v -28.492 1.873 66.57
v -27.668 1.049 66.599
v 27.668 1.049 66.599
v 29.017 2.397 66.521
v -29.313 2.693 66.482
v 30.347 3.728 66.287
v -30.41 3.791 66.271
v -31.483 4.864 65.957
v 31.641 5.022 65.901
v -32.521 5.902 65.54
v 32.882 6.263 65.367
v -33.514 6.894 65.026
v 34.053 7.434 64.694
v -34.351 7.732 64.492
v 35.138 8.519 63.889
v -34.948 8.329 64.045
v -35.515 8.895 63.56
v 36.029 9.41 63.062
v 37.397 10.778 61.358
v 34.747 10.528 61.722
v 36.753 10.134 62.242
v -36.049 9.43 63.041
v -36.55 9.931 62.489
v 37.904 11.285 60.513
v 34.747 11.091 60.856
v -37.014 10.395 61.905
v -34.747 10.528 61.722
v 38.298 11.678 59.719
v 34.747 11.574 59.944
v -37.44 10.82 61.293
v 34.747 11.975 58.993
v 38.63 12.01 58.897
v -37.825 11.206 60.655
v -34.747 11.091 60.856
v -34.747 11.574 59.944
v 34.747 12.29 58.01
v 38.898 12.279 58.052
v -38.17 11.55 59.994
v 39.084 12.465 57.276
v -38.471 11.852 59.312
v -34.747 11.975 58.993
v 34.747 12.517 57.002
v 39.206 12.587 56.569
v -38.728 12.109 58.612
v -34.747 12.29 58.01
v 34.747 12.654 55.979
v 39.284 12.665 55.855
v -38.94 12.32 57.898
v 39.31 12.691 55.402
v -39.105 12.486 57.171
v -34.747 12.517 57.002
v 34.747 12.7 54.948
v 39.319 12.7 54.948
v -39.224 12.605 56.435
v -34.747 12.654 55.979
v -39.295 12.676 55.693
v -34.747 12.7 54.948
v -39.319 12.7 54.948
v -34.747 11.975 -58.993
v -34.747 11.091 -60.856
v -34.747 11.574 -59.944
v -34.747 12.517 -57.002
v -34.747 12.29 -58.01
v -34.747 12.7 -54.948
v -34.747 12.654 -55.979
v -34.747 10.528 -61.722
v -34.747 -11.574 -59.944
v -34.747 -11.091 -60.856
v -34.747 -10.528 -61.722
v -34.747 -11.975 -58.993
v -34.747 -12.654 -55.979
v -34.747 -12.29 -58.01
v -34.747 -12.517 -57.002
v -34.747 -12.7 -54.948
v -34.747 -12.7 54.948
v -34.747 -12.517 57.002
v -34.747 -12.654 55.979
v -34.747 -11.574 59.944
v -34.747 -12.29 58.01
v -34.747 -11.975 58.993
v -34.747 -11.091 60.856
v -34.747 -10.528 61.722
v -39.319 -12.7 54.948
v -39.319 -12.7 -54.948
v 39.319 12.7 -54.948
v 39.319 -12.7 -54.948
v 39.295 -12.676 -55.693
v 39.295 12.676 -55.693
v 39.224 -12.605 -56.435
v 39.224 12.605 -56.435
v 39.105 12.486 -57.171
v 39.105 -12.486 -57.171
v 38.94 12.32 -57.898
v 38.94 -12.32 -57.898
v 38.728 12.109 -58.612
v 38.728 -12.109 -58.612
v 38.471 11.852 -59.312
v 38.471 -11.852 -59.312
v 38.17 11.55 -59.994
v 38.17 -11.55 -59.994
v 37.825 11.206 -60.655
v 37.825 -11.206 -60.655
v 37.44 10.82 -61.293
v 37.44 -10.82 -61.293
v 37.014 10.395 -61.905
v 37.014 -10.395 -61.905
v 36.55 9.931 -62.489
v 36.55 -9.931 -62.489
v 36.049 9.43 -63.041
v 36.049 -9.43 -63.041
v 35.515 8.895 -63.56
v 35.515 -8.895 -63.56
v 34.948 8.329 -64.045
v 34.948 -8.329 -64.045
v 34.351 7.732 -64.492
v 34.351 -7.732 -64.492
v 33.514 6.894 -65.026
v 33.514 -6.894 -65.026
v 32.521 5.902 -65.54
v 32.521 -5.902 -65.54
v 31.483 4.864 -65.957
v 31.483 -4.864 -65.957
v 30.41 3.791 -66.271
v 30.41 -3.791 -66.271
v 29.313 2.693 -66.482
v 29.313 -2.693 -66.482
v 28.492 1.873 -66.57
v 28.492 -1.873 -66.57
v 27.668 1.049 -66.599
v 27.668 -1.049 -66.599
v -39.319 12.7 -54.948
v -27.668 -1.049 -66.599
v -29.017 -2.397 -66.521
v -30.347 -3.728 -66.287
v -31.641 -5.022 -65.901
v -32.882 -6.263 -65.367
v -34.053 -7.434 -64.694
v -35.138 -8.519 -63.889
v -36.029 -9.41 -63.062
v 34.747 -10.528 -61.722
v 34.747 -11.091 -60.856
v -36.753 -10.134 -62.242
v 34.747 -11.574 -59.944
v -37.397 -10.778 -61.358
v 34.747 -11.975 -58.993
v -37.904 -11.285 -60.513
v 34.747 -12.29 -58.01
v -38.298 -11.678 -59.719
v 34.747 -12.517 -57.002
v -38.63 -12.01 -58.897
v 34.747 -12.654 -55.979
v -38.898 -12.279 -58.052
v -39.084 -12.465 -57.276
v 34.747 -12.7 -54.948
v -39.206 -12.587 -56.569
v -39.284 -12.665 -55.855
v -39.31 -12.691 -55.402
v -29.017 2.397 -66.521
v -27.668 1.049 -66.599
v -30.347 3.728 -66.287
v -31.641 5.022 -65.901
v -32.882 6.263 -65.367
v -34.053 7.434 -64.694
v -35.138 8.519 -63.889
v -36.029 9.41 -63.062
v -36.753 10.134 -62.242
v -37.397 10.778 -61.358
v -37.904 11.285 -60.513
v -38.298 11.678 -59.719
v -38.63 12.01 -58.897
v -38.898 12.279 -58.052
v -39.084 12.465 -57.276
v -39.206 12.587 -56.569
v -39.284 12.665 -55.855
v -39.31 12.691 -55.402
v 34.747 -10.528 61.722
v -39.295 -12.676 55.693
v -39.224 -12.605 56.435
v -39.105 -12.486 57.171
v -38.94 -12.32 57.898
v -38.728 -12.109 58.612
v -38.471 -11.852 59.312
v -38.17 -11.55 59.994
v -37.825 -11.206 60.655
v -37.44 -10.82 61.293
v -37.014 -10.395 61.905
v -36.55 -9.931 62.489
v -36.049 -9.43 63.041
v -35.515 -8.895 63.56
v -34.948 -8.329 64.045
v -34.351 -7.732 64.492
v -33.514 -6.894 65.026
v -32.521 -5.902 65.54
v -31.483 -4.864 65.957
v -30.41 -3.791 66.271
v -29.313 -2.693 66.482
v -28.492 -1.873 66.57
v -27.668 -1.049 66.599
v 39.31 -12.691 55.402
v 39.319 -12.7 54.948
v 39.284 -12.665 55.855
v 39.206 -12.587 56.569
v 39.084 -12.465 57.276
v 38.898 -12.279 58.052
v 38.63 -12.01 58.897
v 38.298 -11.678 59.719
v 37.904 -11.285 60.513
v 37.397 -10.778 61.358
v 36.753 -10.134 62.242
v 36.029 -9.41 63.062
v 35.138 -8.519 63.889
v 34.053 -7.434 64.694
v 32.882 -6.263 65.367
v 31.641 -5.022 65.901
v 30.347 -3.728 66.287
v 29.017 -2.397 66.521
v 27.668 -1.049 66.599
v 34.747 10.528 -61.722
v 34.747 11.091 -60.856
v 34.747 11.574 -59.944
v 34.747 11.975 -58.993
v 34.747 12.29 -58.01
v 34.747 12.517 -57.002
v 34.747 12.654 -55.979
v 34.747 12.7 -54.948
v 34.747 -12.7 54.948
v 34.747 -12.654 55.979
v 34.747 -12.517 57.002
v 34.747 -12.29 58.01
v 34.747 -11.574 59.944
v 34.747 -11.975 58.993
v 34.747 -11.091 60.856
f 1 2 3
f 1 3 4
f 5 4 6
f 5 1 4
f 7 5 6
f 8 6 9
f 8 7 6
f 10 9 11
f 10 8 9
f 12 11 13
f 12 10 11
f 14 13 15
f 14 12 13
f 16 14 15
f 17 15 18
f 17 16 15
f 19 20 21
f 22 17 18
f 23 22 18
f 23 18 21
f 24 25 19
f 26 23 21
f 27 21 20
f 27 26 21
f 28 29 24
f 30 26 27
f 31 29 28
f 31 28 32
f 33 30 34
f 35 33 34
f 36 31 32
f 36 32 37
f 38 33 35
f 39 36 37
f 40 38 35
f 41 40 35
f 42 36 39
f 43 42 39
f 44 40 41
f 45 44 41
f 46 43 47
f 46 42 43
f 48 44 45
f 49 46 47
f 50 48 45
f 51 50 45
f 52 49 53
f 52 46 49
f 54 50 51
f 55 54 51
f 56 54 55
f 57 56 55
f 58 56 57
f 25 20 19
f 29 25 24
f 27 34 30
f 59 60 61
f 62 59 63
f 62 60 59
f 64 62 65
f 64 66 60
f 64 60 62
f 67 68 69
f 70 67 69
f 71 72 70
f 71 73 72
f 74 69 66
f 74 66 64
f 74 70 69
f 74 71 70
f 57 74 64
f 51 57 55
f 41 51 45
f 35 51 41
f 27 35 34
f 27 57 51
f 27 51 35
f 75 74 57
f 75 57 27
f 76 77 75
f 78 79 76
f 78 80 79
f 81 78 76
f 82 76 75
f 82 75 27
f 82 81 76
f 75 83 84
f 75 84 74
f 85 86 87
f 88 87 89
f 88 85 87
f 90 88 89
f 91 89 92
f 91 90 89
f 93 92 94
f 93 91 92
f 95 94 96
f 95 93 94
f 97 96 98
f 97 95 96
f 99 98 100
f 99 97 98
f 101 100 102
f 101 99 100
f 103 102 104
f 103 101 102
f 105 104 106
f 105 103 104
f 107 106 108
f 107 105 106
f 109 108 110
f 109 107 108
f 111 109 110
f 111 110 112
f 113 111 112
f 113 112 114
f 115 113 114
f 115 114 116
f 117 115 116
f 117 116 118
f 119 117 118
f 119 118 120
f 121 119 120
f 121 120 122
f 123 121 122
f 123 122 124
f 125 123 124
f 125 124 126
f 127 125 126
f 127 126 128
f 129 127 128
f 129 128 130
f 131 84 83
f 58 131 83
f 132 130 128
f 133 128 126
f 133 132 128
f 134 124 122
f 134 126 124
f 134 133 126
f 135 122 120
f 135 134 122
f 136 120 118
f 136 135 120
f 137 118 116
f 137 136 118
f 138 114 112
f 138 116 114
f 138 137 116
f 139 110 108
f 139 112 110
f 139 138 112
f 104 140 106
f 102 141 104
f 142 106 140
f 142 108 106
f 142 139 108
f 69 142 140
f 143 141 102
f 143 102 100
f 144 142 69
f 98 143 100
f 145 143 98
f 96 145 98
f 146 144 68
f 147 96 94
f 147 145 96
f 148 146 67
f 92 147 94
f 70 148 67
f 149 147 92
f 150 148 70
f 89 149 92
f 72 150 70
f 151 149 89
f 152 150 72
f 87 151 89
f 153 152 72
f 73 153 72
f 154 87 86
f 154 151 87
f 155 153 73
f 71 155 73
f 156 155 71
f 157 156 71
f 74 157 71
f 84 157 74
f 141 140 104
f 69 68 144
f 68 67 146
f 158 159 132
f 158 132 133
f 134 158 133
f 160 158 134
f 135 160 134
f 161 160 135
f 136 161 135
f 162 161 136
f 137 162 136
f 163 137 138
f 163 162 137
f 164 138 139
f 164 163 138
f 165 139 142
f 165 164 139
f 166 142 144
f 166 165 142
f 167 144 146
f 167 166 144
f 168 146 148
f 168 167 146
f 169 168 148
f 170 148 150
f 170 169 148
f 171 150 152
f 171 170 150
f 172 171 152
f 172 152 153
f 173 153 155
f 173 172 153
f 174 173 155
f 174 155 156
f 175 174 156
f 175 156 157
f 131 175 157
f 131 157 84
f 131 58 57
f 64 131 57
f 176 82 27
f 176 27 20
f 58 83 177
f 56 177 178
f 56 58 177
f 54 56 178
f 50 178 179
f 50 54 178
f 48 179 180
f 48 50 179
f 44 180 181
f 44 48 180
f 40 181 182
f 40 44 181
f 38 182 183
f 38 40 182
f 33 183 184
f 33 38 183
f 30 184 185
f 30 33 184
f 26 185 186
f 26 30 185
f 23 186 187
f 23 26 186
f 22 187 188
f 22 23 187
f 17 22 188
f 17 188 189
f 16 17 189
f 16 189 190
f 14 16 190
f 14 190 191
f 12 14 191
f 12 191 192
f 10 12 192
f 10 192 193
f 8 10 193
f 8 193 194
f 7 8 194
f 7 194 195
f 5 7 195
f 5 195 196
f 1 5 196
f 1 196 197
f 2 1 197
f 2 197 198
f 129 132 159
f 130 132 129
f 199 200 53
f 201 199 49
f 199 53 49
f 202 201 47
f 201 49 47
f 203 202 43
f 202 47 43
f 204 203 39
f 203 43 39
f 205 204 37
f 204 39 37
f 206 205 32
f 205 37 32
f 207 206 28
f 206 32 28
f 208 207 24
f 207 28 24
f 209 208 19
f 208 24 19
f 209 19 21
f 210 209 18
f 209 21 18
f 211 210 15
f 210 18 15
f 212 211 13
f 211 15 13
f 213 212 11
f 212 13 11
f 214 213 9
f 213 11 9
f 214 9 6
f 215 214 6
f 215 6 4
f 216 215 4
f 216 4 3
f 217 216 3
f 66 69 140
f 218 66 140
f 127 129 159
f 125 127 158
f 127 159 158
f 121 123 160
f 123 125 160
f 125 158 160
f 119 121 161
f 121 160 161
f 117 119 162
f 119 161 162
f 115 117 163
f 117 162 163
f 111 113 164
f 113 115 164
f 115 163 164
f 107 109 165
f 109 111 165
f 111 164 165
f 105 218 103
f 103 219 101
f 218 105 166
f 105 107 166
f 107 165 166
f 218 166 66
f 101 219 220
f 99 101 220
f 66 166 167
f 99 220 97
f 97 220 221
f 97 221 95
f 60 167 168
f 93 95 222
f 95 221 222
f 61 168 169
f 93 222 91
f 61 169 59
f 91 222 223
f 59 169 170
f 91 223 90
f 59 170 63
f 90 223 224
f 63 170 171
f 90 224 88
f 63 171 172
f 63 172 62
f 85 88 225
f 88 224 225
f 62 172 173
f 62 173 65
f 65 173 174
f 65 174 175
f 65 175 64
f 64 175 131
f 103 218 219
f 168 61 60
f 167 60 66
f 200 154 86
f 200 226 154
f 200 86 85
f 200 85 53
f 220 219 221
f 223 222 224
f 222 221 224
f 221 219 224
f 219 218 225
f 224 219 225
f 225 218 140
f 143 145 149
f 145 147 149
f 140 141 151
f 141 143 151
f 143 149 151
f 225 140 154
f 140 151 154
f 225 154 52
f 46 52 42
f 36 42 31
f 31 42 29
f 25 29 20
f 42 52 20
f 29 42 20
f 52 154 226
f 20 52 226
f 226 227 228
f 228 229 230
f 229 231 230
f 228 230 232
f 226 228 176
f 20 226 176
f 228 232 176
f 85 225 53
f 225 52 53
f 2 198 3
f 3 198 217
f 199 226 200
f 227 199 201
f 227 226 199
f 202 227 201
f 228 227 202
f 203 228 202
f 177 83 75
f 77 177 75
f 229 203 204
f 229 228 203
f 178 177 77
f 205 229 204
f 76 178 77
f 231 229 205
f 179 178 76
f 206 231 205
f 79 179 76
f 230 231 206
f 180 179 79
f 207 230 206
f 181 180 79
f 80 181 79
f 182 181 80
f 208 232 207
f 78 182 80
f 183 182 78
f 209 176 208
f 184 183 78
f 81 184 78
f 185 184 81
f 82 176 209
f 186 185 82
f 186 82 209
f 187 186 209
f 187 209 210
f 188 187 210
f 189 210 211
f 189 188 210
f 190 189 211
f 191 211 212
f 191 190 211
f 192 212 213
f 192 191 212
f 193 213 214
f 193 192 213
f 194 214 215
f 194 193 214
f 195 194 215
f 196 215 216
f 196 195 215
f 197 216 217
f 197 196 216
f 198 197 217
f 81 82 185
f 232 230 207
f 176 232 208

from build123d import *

# Parameters (mm, degrees)
F0_W        = 78.6384046078
F0_H        = 133.1976056099
F0_W_2      = 69.4944038987
F0_H_2      = 123.444005847
F1_DEPTH    = 12.7
F2_T1_DEPTH = 83.6549732601
F2_T3_DEPTH = 136.8933778678


# Not quite as in the source:
# - a fillet or chamfer that OpenCascade refuses, or shapes differently, is made with other operations: its cross-section is extruded or revolved along the edge and cut away or added


with BuildPart() as f1:
    # F0 (on Front) → F1 (new body, symmetric)
    with BuildSketch(Plane.XZ):
        Rectangle(F0_W, F0_H)
        Rectangle(F0_W_2, F0_H_2, mode=Mode.SUBTRACT)
    extrude(amount=F1_DEPTH, both=True)

    # F2: fillet of radius 11.650994652 on 8 edges, made by hand

    # F2_s2 → F2_t1 (cut)
    with BuildSketch(Plane.XZ.offset(-41.82748663)):
        with BuildLine():
            ThreePointArc((39.3192023039, 54.9478081529), (35.9067049779, 63.1863054789), (27.6682076519, 66.5988028049))
            Line((27.6682076519, 66.5988028049), (39.3192023039, 66.5988028049))
            Line((39.3192023039, 66.5988028049), (39.3192023039, 54.9478081529))
        make_face()
        with BuildLine():
            ThreePointArc((-39.3192023039, 54.9478081529), (-35.9067049779, 63.1863054789), (-27.6682076519, 66.5988028049))
            Line((-27.6682076519, 66.5988028049), (-39.3192023039, 66.5988028049))
            Line((-39.3192023039, 66.5988028049), (-39.3192023039, 54.9478081529))
        make_face()
        with BuildLine():
            ThreePointArc((39.3192023039, -54.9478081529), (35.9067049779, -63.1863054789), (27.6682076519, -66.5988028049))
            Line((27.6682076519, -66.5988028049), (39.3192023039, -66.5988028049))
            Line((39.3192023039, -66.5988028049), (39.3192023039, -54.9478081529))
        make_face()
        with BuildLine():
            ThreePointArc((-27.6682076519, -66.5988028049), (-35.9067049779, -63.1863054789), (-39.3192023039, -54.9478081529))
            Line((-39.3192023039, -54.9478081529), (-39.3192023039, -66.5988028049))
            Line((-39.3192023039, -66.5988028049), (-27.6682076519, -66.5988028049))
        make_face()
    extrude(amount=F2_T1_DEPTH, mode=Mode.SUBTRACT)

    # F2_s4 → F2_t3 (cut)
    with BuildSketch(Plane.YZ.offset(-68.4466889339)):
        with BuildLine():
            ThreePointArc((1.049005348, 66.5988028049), (9.287502674, 63.1863054789), (12.7, 54.9478081529))
            Line((12.7, 54.9478081529), (12.7, 66.5988028049))
            Line((12.7, 66.5988028049), (1.049005348, 66.5988028049))
        make_face()
        with BuildLine():
            ThreePointArc((-12.7, 54.9478081529), (-9.287502674, 63.1863054789), (-1.049005348, 66.5988028049))
            Line((-1.049005348, 66.5988028049), (-12.7, 66.5988028049))
            Line((-12.7, 66.5988028049), (-12.7, 54.9478081529))
        make_face()
        with BuildLine():
            ThreePointArc((1.049005348, -66.5988028049), (9.287502674, -63.1863054789), (12.7, -54.9478081529))
            Line((12.7, -54.9478081529), (12.7, -66.5988028049))
            Line((12.7, -66.5988028049), (1.049005348, -66.5988028049))
        make_face()
        with BuildLine():
            ThreePointArc((-1.049005348, -66.5988028049), (-9.287502674, -63.1863054789), (-12.7, -54.9478081529))
            Line((-12.7, -54.9478081529), (-12.7, -66.5988028049))
            Line((-12.7, -66.5988028049), (-1.049005348, -66.5988028049))
        make_face()
    extrude(amount=F2_T3_DEPTH, mode=Mode.SUBTRACT)


solid = f1.part
